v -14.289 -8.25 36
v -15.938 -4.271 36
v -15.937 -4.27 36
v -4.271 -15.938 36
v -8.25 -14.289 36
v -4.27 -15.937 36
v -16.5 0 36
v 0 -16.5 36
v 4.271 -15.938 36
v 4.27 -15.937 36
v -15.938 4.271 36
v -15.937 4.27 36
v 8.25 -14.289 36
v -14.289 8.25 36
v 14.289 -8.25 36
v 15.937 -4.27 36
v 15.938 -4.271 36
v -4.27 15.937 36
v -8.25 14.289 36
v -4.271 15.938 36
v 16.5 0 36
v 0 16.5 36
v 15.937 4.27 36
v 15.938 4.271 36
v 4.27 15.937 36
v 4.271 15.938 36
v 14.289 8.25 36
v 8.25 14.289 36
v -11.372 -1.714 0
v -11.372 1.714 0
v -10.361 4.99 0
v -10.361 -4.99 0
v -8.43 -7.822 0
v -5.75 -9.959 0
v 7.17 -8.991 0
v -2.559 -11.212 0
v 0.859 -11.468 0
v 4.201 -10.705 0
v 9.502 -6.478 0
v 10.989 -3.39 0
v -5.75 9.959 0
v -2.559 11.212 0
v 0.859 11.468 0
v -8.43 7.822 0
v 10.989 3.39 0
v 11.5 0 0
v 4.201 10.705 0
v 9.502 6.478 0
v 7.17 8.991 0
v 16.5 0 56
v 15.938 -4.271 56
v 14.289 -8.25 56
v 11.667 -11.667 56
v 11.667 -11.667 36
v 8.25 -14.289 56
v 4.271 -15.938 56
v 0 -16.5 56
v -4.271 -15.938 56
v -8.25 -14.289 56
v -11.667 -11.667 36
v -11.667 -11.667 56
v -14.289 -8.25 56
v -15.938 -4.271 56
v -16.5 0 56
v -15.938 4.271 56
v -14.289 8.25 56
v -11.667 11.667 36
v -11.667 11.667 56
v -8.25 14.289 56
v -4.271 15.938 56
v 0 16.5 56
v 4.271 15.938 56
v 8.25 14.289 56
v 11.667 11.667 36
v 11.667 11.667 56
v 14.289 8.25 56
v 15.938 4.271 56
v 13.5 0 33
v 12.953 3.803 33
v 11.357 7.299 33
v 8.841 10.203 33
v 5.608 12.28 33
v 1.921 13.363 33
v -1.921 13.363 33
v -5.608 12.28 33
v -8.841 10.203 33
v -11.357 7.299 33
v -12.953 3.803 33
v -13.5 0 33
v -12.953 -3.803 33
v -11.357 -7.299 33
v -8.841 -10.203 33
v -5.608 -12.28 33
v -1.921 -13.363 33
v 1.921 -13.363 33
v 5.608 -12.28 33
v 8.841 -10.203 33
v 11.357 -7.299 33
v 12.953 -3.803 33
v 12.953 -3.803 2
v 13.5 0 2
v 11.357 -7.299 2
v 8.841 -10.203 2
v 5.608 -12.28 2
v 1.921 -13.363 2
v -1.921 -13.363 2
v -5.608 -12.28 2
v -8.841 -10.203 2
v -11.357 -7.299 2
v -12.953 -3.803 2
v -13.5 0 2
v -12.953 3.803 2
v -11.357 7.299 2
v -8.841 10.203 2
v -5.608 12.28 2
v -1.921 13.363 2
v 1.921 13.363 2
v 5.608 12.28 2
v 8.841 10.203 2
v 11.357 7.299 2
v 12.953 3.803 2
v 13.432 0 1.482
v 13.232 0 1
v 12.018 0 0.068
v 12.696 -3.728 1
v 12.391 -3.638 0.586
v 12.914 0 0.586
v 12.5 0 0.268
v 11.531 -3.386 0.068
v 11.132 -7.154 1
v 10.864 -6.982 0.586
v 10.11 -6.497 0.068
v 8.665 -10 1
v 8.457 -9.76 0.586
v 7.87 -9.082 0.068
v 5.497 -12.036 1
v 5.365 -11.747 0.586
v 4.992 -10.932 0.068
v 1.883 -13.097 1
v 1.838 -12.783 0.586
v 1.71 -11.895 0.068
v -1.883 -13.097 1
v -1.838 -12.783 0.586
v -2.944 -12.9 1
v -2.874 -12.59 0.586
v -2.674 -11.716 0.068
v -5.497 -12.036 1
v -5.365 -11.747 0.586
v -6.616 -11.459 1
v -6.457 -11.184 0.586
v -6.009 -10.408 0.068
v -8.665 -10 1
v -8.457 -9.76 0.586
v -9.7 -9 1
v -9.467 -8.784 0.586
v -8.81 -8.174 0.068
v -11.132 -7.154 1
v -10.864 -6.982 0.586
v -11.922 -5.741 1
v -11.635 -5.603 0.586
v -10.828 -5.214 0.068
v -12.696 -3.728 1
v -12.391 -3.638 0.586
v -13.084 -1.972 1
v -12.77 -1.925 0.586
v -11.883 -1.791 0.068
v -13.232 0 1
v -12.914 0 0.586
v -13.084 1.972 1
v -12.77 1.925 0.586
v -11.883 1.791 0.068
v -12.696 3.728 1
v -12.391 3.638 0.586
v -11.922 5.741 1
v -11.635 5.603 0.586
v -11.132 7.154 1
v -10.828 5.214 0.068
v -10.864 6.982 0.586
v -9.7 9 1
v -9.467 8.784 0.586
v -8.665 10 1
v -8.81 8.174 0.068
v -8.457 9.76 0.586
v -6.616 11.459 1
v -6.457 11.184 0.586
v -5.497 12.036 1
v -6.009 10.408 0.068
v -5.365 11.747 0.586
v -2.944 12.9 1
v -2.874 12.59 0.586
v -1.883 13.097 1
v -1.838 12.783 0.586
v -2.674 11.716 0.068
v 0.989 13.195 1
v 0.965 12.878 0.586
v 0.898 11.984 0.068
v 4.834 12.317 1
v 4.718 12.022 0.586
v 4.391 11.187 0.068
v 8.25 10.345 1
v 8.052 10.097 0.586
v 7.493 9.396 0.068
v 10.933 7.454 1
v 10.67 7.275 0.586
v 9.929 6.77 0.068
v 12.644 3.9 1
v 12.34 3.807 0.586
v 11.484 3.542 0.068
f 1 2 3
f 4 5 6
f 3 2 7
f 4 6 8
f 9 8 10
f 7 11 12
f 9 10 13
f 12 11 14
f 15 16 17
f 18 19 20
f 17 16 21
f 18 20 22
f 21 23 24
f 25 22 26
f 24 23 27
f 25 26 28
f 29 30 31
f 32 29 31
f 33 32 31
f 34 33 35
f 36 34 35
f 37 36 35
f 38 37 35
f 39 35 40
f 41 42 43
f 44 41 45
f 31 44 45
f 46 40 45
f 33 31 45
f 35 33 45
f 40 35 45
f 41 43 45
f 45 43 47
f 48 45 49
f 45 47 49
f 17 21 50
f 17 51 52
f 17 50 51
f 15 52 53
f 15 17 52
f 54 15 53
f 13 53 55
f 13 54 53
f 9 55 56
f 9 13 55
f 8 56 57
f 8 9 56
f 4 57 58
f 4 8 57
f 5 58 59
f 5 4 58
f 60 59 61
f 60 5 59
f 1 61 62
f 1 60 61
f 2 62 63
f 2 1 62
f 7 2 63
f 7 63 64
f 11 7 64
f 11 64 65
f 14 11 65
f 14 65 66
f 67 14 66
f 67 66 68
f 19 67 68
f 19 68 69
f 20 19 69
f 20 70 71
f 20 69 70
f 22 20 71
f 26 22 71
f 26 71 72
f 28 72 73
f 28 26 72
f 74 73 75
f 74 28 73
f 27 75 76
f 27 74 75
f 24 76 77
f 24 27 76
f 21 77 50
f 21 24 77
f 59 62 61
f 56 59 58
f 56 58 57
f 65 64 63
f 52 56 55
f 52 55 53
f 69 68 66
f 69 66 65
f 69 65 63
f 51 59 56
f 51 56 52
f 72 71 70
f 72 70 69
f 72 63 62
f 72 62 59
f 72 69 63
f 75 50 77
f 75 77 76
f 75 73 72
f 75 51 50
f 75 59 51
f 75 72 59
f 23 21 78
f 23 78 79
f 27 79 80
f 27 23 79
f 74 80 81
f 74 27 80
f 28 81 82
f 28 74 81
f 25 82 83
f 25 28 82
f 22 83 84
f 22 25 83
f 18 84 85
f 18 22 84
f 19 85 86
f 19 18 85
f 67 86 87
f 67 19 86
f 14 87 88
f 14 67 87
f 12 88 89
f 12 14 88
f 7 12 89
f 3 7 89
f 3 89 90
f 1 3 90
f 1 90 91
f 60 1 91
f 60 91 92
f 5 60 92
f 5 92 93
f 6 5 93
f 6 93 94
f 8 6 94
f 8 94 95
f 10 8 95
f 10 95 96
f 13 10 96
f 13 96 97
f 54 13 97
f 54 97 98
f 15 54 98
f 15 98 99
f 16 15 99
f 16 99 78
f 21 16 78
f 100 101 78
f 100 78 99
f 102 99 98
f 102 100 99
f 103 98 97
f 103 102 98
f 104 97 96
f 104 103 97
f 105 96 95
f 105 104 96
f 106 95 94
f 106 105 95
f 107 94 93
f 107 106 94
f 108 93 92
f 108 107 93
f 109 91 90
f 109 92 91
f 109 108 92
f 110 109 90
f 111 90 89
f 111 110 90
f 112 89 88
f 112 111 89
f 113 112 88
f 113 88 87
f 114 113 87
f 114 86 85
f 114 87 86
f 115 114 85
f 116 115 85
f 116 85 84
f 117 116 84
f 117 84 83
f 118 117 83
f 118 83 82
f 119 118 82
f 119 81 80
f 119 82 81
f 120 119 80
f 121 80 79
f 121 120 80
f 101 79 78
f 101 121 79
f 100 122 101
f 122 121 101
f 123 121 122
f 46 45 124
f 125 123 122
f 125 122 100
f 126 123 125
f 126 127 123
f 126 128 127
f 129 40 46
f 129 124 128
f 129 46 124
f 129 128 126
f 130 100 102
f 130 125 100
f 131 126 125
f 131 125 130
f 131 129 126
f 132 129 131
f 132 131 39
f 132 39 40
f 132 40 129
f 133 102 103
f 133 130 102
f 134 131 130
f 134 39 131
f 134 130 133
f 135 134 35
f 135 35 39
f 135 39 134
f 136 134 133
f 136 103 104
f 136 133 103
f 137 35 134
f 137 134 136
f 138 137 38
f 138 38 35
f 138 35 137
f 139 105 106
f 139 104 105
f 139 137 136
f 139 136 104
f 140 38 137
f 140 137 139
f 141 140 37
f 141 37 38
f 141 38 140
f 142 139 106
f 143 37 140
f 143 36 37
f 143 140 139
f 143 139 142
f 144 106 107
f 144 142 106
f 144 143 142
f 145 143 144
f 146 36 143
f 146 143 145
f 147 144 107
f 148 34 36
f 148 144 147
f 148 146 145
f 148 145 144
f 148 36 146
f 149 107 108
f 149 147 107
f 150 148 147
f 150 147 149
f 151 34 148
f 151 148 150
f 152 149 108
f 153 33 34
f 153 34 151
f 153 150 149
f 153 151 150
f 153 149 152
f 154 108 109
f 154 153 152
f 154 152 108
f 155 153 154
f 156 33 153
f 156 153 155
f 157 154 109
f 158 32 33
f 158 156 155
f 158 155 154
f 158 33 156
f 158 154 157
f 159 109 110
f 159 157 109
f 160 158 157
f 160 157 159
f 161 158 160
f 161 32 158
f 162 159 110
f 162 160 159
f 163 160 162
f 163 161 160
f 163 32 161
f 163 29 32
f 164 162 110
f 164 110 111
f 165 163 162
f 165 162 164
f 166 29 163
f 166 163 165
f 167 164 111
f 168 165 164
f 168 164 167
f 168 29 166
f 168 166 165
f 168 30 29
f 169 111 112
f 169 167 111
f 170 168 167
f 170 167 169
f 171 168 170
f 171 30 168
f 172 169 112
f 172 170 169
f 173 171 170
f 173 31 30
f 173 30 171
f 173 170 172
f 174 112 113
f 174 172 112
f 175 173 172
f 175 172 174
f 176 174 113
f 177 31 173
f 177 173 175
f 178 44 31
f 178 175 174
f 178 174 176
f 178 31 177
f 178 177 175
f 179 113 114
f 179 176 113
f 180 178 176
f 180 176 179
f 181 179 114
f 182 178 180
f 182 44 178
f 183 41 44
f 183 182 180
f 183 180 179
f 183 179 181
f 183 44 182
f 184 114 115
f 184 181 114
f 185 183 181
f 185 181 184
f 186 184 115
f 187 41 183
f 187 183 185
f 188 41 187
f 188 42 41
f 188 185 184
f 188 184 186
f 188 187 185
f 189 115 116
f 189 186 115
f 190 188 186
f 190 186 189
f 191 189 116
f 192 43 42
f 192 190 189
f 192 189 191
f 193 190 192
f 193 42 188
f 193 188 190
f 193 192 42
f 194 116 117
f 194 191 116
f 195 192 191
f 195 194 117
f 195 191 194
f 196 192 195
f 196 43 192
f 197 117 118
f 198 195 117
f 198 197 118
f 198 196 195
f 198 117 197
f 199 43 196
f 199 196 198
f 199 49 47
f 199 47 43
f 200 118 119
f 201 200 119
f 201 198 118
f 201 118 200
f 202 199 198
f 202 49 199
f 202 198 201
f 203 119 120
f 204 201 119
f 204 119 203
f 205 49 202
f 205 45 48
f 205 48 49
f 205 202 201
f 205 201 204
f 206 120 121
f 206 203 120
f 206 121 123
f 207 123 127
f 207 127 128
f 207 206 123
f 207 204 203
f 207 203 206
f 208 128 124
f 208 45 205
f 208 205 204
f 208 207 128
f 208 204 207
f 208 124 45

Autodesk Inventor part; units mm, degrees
ref_plane "YZ Plane" through (0, 0, 0) normal (1, 0, 0) x (0, 1, 0)
ref_plane "XZ Plane" through (0, 0, 0) normal (0, 1, 0) x (-1, 0, 0)
ref_plane "XY Plane" through (0, 0, 0) normal (0, 0, 1) x (1, 0, 0)
sketch "Sketch1" plane through (0, 0, 0) normal (0, 0, 1) x (1, 0, 0)
  circle A0 centre (0, 0) radius 13.5
  dimension "d0" = 27
extrude "Extrusion1" add sketch "Sketch1" along normal blind 36
sketch "Sketch2" plane through (0, 0, 36) normal (0, 0, 1) x (1, 0, 0)
  circle A0 centre (0, 0) radius 16.5
  dimension "d3" = 33
extrude "Extrusion2" add sketch "Sketch2" along normal blind 20
fillet "Fillet1" radius 2 1 edges at (-13.5, 0, 0)
chamfer "Chamfer1" distance 3 angle 45 1 edges at (-13.5, 0, 36)
properties part number "DispenserHead"
